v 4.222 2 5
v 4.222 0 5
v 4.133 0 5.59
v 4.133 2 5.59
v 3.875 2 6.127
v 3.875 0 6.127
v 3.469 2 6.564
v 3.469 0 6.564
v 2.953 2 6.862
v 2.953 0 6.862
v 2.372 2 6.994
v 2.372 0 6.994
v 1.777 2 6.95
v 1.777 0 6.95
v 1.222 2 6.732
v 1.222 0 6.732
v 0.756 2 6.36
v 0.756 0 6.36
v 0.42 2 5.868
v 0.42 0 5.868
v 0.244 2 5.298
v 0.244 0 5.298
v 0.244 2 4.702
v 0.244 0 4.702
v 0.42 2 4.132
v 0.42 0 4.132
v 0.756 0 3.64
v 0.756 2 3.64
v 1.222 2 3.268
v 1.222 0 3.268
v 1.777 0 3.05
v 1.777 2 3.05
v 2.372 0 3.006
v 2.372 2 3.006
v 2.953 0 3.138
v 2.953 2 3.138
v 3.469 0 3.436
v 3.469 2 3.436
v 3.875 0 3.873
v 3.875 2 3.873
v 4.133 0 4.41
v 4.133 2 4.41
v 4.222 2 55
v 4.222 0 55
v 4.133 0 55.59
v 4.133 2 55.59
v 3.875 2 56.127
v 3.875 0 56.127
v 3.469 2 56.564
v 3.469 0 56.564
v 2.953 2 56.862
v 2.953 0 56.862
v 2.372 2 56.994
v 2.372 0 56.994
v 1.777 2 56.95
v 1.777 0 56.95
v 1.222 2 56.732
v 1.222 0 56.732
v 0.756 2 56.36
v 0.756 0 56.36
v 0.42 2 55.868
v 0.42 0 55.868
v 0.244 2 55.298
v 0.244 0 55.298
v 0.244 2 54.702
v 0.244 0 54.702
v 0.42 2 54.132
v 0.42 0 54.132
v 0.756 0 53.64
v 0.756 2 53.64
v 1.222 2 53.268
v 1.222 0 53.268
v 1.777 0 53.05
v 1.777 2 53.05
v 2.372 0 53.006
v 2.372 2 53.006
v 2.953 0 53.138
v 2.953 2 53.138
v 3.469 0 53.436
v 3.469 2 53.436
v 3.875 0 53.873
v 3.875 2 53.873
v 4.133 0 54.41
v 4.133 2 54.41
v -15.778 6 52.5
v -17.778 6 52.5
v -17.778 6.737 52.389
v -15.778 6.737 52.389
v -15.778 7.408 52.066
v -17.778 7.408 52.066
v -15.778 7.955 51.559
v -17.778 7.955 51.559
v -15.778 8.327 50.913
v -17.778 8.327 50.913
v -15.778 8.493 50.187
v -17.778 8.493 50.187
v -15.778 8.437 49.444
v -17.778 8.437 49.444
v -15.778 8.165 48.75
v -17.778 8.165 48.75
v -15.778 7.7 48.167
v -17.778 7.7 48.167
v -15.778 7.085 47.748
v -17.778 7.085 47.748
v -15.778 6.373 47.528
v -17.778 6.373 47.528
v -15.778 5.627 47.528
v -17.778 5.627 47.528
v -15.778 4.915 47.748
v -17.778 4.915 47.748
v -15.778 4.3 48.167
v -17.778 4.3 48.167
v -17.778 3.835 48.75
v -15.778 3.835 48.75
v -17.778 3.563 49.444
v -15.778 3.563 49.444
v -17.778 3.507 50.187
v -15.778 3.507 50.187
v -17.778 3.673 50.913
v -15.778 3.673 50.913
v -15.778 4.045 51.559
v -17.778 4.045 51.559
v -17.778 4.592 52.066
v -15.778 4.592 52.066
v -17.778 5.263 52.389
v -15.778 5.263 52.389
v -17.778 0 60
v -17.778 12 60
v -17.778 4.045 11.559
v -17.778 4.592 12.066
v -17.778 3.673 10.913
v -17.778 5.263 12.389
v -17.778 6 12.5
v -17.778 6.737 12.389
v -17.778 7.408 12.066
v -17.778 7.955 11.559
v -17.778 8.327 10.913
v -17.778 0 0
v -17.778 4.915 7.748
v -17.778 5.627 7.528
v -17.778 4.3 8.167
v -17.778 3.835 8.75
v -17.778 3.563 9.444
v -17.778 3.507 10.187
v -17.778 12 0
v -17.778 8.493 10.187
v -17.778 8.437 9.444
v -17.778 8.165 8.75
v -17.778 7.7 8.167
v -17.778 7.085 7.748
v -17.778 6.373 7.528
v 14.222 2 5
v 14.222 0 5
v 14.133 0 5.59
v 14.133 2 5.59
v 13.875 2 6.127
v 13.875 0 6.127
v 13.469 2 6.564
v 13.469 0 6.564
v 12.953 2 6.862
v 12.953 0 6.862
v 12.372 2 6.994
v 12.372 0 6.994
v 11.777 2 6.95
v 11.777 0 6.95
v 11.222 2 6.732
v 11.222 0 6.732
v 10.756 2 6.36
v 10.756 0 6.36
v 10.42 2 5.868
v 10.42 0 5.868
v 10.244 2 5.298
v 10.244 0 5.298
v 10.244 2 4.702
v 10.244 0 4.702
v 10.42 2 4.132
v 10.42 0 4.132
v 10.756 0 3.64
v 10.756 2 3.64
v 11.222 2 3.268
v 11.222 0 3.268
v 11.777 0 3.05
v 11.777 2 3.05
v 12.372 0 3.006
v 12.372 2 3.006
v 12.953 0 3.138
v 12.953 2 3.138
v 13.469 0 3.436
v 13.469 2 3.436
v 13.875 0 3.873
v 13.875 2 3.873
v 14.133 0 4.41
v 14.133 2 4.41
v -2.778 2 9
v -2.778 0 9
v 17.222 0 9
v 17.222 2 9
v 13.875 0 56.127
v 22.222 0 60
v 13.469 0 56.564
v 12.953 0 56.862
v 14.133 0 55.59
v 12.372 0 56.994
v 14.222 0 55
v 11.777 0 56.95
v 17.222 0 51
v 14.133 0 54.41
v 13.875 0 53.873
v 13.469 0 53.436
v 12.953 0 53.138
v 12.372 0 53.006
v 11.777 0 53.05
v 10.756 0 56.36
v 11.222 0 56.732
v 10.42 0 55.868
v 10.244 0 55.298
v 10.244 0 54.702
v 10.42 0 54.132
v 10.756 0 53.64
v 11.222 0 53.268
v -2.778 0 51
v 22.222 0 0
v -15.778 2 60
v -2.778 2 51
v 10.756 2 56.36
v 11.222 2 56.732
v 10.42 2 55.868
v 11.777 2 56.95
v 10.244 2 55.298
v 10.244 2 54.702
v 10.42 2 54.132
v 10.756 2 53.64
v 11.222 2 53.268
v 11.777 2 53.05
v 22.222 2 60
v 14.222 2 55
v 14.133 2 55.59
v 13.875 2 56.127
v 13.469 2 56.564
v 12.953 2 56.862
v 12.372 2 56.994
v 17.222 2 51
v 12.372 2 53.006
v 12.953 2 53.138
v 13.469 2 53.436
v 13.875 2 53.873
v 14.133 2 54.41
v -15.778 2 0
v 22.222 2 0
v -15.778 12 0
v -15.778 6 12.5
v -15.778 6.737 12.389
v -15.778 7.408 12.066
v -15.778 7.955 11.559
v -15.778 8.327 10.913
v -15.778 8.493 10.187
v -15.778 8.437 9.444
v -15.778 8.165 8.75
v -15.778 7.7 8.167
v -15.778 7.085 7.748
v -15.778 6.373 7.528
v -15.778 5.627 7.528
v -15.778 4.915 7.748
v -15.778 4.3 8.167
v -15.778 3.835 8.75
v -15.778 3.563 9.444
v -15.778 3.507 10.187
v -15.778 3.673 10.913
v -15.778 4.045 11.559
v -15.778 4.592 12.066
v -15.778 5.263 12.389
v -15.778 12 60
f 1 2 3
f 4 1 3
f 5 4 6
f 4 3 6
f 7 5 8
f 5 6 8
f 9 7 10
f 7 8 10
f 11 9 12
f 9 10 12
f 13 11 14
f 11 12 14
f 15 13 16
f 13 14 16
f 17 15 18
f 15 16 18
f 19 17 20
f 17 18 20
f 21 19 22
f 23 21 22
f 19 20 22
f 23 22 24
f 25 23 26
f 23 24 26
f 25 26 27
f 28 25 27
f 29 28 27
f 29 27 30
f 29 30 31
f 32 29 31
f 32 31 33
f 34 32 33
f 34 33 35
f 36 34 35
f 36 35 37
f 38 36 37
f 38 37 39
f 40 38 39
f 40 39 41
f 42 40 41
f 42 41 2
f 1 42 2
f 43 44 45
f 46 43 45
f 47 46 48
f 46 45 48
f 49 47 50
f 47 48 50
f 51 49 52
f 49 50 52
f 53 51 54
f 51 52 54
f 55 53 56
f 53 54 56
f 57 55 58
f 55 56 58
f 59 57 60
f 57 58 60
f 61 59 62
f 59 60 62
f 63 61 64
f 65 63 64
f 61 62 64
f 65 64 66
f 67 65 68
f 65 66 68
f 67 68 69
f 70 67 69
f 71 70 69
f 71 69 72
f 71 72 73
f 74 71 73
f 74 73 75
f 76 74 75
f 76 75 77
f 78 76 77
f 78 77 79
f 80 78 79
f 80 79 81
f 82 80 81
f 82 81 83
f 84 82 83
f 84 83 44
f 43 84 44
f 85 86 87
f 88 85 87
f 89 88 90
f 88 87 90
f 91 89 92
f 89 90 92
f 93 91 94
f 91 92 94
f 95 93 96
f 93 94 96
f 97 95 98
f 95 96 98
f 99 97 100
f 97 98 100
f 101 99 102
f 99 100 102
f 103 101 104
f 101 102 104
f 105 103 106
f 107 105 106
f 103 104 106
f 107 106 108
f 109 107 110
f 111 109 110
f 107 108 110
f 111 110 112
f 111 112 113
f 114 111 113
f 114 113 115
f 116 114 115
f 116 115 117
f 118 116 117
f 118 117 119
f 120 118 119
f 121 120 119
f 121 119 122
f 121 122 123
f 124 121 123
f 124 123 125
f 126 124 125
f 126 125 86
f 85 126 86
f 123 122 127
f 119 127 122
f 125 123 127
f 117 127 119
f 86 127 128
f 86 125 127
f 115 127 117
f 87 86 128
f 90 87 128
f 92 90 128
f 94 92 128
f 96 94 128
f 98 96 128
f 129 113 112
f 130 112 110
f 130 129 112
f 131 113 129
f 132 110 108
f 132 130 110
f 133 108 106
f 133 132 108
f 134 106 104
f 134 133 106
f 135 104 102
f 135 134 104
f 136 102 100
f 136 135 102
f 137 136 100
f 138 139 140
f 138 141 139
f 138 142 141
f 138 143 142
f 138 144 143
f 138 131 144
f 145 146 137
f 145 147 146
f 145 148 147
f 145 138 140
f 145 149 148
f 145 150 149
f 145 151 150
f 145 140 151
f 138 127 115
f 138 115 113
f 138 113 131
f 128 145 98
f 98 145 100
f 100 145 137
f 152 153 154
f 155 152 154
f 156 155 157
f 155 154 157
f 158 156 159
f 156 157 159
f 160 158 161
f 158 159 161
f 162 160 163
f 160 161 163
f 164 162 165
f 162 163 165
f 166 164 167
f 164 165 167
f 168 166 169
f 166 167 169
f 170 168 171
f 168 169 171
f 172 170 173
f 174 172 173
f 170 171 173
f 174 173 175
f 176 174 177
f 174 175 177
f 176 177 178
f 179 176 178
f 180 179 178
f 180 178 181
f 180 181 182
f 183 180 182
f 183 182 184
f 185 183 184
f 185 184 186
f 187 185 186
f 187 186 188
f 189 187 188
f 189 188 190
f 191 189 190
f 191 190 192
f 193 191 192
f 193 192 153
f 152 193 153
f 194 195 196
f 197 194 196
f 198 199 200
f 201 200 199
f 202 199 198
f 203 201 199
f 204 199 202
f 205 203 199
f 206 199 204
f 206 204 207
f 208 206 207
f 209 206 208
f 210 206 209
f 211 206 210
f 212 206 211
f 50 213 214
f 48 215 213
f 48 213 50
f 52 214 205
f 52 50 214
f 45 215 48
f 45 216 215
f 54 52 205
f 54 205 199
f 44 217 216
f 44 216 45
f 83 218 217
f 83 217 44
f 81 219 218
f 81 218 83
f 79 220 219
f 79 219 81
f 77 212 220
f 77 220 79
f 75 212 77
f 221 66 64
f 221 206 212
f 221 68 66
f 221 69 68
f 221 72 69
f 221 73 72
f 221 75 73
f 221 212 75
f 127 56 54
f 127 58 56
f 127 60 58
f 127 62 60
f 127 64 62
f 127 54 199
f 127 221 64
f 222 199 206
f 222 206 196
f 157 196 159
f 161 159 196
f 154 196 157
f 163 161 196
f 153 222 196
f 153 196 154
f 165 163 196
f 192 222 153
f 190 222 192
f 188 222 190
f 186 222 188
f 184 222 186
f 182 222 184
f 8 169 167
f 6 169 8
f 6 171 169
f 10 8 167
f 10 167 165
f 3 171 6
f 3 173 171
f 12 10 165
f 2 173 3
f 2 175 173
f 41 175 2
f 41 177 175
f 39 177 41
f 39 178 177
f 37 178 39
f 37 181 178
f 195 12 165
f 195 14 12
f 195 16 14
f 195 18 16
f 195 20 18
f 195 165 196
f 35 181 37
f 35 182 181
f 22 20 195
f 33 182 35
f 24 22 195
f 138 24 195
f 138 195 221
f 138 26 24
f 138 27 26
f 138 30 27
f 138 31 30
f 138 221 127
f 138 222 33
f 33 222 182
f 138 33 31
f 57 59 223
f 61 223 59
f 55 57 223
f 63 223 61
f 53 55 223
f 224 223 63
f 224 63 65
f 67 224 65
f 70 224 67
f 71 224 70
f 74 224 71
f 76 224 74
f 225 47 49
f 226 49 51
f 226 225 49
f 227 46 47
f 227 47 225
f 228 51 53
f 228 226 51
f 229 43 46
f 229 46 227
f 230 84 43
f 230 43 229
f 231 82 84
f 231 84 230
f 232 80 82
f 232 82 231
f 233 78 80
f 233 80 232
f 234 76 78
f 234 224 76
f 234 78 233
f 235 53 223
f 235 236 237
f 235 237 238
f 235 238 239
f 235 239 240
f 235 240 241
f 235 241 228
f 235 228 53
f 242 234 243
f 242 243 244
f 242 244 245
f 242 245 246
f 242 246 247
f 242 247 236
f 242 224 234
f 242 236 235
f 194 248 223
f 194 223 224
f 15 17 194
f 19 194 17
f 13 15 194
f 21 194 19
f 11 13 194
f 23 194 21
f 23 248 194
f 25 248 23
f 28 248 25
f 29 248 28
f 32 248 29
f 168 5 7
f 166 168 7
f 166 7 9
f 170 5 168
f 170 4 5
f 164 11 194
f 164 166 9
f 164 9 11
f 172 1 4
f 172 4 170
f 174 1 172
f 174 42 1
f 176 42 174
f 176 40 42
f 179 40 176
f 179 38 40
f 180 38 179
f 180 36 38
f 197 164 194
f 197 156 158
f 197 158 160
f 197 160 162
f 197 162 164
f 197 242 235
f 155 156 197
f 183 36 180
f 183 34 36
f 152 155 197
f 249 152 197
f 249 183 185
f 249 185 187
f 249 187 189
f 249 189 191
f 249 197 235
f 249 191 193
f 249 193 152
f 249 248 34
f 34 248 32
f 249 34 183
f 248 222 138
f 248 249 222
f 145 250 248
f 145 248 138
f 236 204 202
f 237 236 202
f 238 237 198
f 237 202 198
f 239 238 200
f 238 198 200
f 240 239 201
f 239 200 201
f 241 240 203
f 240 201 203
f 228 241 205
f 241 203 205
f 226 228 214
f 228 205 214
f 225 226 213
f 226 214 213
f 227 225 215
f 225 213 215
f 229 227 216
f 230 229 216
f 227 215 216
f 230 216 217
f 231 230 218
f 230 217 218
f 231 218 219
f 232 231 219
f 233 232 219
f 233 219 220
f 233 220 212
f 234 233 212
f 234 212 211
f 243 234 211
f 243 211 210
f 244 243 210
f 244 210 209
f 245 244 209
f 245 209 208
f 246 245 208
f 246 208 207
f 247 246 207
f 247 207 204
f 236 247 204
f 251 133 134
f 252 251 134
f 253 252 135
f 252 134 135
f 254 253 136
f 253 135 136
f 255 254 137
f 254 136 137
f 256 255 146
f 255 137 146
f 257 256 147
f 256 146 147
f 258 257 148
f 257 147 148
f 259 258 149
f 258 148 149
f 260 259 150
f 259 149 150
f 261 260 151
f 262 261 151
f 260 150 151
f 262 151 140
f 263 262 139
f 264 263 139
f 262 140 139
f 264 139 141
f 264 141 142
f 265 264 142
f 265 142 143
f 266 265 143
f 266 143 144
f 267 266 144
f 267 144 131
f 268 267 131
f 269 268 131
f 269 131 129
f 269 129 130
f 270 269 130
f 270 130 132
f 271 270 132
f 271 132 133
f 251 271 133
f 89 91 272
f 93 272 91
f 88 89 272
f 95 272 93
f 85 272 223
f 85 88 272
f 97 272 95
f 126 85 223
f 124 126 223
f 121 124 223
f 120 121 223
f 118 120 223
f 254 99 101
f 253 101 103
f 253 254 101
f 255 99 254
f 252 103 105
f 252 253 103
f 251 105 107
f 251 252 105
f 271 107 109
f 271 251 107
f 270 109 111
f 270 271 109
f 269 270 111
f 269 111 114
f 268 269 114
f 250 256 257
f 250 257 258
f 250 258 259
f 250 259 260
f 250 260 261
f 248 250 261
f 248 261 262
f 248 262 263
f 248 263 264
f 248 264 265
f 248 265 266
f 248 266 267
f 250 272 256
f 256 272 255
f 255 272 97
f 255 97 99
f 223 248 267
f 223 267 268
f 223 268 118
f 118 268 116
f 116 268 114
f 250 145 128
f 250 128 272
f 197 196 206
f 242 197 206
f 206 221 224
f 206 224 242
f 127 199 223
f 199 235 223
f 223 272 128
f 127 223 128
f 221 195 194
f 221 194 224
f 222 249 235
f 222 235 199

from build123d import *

# Parameters (mm, degrees)
SALIENTE_EXTRUIR1_DEPTH = 60
CROQUIS3_R              = 2.5
CORTAR_EXTRUIR1_DEPTH   = 60
CROQUIS4_R              = 2
CROQUIS4_W              = 20
CROQUIS4_H              = 42
CORTAR_EXTRUIR2_DEPTH   = 60


with BuildPart() as part:
    # Croquis2 → Saliente-Extruir1 (new body)
    with BuildSketch(Plane.XY):
        Polygon((22.222055452, 0), (-17.777944548, 0), (-17.777944548, 12), (-15.777944548, 12), (-15.777944548, 2), (22.222055452, 2), align=None)
    extrude(amount=SALIENTE_EXTRUIR1_DEPTH)

    # Croquis3 → Cortar-Extruir1 (cut)
    with BuildSketch(Plane.ZY.offset(17.777944548)):
        with Locations((10, 6)):
            Circle(CROQUIS3_R)
        with Locations((50, 6)):
            Circle(CROQUIS3_R)
    extrude(amount=-CORTAR_EXTRUIR1_DEPTH, mode=Mode.SUBTRACT)

    # Croquis4 → Cortar-Extruir2 (cut)
    with BuildSketch(Plane.XZ):
        with Locations((2.222055452, 55)):
            Circle(CROQUIS4_R)
        with Locations((12.222055452, 55)):
            Circle(CROQUIS4_R)
        with Locations((2.222055452, 5)):
            Circle(CROQUIS4_R)
        with Locations((12.222055452, 5)):
            Circle(CROQUIS4_R)
        with Locations((7.222055452, 30)):
            Rectangle(CROQUIS4_W, CROQUIS4_H)
    extrude(amount=-CORTAR_EXTRUIR2_DEPTH, mode=Mode.SUBTRACT)


solid = part.part
